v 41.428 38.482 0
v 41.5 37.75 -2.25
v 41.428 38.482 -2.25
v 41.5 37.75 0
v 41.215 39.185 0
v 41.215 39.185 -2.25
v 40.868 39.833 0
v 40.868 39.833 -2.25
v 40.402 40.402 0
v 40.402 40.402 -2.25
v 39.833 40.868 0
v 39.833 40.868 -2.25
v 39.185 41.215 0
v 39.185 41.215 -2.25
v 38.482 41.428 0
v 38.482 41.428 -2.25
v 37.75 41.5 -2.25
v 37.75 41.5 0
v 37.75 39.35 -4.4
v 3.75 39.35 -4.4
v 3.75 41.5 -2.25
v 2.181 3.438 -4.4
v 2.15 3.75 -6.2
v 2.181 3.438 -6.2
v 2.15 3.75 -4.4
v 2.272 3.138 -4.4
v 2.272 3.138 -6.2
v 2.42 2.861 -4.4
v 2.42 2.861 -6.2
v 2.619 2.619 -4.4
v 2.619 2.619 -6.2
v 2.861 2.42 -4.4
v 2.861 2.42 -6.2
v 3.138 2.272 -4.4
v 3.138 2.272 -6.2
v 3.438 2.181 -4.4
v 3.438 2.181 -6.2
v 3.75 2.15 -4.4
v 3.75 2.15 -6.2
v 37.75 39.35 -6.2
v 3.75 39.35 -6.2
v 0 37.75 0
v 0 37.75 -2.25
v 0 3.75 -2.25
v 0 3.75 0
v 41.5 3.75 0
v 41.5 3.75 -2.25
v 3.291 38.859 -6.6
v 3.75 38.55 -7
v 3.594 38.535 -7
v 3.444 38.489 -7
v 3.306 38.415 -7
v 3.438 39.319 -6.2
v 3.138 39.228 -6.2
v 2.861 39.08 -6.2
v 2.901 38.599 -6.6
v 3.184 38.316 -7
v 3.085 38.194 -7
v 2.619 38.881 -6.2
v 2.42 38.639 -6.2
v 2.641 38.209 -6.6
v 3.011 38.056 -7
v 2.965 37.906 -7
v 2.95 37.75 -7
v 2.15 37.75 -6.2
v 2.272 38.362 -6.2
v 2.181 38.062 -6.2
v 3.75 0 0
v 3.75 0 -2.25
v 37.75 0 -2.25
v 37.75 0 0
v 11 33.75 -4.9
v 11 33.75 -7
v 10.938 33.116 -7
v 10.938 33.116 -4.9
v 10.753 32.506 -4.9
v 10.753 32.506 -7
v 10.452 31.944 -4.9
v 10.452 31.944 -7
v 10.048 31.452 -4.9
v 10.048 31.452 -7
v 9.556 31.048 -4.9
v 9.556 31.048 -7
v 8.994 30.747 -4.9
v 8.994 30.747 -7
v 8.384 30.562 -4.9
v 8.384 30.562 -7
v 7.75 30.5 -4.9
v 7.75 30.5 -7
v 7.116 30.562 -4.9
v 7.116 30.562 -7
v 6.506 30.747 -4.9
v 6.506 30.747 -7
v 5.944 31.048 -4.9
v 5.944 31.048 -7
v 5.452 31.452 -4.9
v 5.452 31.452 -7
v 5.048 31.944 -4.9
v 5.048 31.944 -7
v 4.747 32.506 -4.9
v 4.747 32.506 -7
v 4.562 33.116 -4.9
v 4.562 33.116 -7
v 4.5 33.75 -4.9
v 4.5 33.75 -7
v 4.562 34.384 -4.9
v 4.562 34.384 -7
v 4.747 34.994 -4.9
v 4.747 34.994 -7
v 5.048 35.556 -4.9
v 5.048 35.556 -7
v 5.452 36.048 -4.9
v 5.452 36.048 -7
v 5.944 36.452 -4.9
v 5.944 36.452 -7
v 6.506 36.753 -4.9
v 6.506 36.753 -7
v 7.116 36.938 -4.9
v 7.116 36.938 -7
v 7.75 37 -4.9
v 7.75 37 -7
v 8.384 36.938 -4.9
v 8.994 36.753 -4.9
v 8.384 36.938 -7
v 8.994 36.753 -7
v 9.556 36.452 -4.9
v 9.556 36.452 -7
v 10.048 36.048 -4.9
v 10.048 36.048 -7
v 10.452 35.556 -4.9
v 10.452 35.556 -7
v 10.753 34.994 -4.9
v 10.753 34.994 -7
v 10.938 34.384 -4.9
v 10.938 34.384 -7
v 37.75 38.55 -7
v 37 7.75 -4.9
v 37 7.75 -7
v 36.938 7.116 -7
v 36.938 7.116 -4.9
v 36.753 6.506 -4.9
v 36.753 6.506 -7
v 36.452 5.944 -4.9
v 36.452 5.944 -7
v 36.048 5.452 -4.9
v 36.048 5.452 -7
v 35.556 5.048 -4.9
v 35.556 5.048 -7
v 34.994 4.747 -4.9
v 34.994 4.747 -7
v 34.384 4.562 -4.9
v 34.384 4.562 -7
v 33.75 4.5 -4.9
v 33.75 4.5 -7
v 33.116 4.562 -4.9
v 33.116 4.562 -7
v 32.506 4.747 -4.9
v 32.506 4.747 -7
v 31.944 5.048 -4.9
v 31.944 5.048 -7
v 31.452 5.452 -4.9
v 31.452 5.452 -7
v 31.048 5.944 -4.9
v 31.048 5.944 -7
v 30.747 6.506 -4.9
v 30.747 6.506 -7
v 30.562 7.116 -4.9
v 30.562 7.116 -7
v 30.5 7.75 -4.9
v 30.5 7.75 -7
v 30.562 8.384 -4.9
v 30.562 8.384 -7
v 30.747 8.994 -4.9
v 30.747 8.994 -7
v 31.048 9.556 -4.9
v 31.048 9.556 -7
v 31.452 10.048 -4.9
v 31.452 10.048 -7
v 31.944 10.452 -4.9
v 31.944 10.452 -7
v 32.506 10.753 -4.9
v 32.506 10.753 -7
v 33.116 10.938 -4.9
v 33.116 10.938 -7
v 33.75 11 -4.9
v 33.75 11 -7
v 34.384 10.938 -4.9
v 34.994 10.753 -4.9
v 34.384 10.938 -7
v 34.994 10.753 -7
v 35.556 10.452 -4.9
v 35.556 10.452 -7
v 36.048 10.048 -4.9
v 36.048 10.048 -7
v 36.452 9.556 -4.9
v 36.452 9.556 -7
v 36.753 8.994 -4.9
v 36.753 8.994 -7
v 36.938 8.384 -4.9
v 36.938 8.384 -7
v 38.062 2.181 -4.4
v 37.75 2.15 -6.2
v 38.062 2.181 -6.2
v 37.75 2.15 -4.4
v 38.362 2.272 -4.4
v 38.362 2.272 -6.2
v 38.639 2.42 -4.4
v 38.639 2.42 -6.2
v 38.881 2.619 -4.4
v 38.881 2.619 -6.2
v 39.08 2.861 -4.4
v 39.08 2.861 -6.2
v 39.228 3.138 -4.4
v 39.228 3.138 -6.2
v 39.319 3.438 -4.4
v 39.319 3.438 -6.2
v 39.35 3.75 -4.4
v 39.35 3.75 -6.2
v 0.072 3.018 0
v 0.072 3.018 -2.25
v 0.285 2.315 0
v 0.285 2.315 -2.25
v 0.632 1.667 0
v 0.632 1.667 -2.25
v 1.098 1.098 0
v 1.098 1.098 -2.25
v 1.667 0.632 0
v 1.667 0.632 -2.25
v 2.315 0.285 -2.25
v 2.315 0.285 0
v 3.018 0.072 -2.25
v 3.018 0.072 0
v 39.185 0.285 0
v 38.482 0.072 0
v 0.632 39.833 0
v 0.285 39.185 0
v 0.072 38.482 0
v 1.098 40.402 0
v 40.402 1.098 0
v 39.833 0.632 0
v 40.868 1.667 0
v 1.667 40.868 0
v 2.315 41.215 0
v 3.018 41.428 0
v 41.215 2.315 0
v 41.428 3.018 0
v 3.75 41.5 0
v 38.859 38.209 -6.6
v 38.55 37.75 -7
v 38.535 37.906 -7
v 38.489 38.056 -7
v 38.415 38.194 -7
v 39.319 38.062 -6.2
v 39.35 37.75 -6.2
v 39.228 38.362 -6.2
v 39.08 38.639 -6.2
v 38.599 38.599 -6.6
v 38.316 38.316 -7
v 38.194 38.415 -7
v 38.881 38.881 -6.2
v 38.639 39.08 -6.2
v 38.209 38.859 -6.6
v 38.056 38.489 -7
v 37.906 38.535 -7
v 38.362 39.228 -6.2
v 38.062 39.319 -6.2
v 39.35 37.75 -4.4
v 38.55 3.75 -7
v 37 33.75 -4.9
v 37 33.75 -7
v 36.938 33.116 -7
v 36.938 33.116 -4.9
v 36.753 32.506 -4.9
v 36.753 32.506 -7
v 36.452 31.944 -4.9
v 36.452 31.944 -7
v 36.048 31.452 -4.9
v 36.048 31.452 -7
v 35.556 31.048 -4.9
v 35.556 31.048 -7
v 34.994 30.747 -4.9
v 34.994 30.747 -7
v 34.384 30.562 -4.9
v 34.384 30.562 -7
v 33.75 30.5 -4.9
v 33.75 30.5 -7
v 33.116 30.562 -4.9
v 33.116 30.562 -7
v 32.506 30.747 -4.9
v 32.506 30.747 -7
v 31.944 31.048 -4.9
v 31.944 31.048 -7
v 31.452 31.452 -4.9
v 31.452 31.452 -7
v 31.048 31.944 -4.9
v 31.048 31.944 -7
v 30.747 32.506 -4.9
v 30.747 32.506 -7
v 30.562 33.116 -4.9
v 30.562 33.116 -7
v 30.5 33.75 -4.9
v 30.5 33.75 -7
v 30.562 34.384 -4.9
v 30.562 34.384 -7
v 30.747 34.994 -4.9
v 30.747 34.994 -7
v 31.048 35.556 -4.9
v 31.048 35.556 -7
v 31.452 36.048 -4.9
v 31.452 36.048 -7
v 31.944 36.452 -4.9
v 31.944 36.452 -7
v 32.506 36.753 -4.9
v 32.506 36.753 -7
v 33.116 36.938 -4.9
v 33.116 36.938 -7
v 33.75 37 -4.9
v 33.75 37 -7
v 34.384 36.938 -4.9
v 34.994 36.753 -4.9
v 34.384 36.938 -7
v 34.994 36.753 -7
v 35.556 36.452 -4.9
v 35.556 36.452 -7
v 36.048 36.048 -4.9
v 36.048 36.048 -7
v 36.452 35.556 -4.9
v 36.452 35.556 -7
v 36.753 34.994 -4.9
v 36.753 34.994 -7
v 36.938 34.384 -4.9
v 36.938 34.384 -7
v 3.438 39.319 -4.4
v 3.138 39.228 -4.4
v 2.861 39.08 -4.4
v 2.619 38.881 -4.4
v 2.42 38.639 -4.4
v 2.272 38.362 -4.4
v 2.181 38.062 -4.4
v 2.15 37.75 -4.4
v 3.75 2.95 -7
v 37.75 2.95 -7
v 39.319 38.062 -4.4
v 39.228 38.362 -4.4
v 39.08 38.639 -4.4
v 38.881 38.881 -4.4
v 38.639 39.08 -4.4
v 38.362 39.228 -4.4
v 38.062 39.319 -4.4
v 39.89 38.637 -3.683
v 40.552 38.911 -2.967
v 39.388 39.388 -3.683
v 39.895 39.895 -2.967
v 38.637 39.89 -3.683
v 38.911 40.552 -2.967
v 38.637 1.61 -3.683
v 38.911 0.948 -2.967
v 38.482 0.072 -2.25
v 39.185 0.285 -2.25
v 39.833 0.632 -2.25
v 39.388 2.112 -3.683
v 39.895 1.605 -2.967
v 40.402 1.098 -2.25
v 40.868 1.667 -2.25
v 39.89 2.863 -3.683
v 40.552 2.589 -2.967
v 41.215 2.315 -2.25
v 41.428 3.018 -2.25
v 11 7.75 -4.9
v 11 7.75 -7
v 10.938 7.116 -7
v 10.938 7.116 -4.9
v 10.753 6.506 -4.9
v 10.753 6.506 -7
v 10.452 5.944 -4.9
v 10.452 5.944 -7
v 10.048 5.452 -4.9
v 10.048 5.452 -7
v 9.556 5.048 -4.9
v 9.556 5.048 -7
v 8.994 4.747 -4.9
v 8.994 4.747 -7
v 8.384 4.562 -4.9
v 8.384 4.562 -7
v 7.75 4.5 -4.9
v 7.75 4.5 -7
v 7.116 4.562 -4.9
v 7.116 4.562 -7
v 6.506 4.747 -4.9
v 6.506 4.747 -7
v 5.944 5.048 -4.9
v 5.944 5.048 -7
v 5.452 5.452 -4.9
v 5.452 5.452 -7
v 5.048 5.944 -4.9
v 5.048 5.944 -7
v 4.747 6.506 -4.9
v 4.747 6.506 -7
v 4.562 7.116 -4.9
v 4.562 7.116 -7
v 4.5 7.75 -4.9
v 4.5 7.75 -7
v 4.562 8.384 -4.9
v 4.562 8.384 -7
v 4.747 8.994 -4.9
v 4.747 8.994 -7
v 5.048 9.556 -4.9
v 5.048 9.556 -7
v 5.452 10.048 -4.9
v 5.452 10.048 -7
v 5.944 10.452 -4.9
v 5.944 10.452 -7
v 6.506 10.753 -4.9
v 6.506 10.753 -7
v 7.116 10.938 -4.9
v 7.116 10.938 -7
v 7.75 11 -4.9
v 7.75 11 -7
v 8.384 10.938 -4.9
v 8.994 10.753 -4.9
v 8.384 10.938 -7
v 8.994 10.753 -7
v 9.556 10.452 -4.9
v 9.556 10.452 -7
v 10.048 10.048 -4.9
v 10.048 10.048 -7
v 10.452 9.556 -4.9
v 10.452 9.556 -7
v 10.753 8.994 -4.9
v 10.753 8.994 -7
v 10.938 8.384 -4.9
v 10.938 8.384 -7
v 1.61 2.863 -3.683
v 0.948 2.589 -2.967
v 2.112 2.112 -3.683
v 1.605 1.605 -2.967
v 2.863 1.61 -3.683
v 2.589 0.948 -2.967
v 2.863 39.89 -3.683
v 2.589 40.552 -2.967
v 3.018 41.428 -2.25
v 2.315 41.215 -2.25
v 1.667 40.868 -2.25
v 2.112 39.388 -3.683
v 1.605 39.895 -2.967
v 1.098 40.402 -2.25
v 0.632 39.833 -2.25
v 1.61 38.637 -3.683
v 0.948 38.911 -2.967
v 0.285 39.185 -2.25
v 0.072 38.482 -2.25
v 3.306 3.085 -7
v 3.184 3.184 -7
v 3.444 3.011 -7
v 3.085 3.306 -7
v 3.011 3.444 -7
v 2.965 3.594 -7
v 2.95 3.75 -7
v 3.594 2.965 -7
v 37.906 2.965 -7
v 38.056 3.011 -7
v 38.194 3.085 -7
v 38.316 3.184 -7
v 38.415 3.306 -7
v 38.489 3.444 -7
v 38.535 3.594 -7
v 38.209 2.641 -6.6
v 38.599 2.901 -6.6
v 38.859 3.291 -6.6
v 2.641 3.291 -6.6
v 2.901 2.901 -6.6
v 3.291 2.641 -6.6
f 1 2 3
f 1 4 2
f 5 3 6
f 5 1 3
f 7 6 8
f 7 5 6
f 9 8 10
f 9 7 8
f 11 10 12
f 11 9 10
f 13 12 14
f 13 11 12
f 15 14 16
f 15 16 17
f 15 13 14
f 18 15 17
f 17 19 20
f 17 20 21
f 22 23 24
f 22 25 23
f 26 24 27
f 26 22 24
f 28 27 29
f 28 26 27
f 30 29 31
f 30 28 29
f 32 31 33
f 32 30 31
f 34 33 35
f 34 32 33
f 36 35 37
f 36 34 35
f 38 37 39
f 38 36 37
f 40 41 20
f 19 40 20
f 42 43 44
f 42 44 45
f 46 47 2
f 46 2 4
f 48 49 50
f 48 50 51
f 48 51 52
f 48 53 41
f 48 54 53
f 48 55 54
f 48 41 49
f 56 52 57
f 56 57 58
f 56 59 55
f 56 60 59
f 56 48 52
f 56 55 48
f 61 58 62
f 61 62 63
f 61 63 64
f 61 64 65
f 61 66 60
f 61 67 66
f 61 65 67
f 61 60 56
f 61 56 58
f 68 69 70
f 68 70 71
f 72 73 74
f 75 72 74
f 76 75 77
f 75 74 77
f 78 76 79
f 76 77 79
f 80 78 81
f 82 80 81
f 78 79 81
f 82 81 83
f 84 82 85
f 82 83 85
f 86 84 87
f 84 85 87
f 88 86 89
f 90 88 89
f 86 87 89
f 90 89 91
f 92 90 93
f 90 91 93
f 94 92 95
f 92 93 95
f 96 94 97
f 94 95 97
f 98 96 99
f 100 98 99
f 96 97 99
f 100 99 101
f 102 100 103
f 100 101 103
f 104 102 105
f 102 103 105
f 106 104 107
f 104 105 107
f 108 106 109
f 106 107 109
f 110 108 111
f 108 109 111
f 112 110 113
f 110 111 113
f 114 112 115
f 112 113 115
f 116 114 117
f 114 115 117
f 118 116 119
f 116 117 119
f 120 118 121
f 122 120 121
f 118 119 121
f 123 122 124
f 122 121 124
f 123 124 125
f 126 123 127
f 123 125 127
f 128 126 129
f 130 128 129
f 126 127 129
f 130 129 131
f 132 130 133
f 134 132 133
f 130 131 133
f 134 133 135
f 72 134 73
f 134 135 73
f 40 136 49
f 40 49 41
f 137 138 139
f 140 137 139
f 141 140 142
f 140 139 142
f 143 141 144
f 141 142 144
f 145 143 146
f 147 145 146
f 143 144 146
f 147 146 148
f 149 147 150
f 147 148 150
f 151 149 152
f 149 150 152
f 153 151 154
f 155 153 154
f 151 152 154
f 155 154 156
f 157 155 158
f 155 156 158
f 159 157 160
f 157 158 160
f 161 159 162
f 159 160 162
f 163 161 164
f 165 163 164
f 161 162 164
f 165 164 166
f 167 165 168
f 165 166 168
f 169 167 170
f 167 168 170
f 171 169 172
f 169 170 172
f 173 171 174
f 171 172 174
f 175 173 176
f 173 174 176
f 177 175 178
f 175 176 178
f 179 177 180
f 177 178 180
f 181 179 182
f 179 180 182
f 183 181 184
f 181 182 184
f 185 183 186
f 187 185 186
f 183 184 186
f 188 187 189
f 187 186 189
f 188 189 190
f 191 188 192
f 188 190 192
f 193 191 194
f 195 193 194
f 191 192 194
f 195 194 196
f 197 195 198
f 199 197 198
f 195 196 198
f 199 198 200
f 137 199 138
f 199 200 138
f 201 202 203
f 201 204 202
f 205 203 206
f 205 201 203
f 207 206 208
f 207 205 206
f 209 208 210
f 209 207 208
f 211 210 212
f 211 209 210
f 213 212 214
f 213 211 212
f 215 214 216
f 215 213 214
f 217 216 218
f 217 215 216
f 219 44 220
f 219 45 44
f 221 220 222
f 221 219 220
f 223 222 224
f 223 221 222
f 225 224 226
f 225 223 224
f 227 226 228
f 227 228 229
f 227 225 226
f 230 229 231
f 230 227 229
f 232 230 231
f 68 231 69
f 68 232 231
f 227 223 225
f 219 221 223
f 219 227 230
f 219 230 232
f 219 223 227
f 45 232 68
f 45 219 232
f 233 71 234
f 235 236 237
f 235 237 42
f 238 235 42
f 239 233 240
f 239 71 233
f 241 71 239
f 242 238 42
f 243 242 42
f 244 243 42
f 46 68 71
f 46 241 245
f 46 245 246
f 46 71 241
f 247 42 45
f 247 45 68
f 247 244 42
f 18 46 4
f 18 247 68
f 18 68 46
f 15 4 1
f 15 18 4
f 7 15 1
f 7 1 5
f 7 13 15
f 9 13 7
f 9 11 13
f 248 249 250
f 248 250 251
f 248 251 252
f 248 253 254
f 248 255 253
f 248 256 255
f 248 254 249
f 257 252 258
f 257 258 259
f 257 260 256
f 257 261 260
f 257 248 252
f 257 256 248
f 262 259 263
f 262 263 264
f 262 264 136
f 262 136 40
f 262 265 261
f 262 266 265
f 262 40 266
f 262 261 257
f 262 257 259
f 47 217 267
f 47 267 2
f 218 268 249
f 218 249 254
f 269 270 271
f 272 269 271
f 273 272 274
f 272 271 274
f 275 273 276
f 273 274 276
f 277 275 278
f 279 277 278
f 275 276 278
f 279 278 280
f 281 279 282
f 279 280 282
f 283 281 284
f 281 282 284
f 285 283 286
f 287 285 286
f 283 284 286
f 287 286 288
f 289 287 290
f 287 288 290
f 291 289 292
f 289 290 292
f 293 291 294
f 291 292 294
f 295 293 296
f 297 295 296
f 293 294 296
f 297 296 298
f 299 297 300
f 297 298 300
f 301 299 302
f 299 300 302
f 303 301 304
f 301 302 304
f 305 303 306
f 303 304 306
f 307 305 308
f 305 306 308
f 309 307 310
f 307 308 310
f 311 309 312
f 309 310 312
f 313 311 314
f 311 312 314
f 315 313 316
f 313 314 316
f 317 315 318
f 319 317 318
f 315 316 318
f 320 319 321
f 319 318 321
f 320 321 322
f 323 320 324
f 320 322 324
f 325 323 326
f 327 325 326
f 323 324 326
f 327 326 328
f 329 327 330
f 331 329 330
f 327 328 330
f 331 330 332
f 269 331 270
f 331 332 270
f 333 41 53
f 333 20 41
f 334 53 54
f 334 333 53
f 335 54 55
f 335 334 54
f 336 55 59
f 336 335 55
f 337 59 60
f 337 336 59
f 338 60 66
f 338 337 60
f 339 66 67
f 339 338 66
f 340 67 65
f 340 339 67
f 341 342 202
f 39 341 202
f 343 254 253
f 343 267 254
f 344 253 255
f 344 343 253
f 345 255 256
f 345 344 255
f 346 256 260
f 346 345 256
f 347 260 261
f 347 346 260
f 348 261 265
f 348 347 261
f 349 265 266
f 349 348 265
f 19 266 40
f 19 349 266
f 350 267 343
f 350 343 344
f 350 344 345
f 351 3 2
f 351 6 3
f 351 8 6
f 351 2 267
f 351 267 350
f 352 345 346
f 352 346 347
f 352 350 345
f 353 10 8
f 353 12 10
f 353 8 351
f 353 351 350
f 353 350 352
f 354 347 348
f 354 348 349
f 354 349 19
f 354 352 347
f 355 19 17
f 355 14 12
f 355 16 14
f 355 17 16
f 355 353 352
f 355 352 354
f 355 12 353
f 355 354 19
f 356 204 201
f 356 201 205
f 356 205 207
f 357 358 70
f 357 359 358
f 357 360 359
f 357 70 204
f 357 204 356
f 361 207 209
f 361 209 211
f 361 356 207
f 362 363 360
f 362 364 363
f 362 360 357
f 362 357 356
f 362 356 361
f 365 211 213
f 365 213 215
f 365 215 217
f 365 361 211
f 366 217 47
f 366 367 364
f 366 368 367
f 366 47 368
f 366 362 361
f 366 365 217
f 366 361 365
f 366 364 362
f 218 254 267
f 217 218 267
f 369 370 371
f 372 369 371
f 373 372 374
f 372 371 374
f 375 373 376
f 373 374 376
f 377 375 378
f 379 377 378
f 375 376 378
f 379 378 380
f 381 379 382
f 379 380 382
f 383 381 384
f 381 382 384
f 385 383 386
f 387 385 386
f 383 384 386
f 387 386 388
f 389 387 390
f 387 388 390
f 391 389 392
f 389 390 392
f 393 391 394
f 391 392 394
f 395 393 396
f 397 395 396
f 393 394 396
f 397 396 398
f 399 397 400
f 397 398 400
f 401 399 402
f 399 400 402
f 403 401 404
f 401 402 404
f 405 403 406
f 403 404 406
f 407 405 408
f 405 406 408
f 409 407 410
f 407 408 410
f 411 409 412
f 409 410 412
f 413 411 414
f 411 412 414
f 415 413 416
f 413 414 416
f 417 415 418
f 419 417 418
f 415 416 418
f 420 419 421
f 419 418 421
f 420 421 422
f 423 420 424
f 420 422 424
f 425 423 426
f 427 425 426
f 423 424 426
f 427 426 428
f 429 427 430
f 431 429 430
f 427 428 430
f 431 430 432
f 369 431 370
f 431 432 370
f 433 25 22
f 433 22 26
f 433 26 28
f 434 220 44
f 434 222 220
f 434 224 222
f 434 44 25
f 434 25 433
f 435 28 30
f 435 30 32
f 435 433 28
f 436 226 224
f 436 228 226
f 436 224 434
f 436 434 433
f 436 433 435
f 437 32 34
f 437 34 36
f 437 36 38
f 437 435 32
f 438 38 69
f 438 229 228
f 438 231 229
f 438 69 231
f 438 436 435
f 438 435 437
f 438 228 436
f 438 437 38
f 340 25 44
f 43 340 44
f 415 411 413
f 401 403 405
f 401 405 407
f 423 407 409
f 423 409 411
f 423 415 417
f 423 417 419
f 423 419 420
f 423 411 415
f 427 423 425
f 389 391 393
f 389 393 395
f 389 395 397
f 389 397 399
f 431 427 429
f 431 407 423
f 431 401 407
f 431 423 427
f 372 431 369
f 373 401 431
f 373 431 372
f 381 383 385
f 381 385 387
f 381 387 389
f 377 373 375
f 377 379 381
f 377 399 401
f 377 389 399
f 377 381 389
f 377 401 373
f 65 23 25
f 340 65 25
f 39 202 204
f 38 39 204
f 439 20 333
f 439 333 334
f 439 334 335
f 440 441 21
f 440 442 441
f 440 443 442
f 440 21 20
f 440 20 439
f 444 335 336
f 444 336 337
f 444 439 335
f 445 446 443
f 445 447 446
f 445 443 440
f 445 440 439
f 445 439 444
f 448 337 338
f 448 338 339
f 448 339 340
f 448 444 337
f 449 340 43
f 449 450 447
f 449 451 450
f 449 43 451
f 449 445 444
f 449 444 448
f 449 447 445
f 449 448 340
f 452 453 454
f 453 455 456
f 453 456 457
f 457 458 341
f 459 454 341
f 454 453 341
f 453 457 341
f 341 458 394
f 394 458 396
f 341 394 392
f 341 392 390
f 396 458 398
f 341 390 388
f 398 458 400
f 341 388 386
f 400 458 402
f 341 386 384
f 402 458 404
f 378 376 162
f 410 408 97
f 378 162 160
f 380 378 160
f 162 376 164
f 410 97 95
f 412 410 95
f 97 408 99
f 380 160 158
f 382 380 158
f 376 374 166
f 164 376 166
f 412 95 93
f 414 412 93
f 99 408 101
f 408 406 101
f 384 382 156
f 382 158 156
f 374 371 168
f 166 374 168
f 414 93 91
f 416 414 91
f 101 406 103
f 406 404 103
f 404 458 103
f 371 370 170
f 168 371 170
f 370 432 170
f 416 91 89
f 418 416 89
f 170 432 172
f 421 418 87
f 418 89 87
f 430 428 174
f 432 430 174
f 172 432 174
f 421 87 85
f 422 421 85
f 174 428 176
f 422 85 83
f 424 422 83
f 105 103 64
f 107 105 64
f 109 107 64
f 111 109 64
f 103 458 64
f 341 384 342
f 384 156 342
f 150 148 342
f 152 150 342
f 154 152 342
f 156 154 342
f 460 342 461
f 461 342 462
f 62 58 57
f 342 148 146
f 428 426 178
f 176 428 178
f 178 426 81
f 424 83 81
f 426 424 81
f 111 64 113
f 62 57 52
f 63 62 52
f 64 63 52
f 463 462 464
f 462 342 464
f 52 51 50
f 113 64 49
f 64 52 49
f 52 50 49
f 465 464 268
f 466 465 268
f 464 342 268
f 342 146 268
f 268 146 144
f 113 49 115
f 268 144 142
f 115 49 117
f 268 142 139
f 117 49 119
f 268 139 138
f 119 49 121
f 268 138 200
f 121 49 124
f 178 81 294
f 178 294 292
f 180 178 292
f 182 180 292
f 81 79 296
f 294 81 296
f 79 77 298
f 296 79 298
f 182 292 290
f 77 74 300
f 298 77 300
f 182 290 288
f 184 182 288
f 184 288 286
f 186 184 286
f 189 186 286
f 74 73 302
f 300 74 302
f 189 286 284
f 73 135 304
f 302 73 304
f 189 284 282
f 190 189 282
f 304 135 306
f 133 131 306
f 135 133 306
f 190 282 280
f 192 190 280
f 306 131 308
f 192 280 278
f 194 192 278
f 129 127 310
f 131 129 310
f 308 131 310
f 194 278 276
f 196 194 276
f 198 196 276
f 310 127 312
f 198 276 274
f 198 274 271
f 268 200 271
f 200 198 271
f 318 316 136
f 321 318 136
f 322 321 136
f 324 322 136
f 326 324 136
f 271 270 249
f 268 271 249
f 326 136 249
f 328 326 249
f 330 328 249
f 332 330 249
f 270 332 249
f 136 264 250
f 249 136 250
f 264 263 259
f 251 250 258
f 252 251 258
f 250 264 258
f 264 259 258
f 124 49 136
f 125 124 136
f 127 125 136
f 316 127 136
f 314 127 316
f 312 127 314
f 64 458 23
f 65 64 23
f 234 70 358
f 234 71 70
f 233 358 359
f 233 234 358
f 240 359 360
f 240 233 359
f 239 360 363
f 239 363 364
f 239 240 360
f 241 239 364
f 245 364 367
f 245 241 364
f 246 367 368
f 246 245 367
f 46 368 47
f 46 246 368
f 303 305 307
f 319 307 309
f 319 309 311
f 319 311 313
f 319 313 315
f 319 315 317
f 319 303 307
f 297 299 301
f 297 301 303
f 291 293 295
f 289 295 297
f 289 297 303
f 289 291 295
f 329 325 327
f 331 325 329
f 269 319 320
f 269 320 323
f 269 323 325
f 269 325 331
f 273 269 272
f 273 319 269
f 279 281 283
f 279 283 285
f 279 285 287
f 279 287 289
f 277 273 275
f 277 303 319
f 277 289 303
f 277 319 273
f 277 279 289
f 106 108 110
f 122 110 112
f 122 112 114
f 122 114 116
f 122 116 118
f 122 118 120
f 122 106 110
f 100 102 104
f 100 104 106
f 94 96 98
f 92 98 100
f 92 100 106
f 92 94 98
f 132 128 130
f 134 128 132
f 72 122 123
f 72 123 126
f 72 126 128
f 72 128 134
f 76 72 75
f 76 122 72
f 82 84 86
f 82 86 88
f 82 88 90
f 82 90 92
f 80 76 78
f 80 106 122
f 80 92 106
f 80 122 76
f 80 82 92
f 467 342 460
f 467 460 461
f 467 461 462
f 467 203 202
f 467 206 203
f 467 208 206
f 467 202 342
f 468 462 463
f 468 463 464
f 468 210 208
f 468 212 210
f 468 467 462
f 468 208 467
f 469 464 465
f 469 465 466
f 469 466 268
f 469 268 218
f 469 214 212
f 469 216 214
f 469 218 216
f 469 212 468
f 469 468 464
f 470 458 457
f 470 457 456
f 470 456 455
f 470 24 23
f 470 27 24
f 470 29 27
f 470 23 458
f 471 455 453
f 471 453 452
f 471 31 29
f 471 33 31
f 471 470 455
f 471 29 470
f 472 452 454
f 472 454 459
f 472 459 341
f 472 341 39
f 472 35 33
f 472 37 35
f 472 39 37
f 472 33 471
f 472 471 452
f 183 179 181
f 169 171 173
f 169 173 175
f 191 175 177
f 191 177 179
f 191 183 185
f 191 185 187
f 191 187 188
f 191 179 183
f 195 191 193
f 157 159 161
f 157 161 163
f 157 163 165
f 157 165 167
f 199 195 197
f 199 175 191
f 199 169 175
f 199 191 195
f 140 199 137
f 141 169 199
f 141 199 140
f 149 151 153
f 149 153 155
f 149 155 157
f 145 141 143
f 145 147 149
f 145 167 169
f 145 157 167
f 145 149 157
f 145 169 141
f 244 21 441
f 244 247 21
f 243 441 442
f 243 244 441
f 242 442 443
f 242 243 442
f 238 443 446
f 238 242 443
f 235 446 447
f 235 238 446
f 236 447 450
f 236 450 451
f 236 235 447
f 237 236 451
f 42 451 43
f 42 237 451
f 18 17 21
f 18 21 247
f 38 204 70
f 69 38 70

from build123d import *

# Parameters (mm, degrees)
PAD_DEPTH    = 7
SKETCH002_R  = 3.25
POCKET_DEPTH = 2.1


with BuildPart() as part:
    # AdditivePipe: sweep along a path in Sketch001
    with BuildLine(Plane.XY) as additivepipe_path:
        ThreePointArc((0, 3.75), (1.09835, 1.09835), (3.75, 0))
        Line((3.75, 0), (37.75, 0))
        ThreePointArc((37.75, 0), (40.40165, 1.09835), (41.5, 3.75))
        Line((41.5, 3.75), (41.5, 37.75))
        ThreePointArc((41.5, 37.75), (40.40165, 40.40165), (37.75, 41.5))
        Line((37.75, 41.5), (3.75, 41.5))
        ThreePointArc((3.75, 41.5), (1.09835, 40.40165), (0, 37.75))
        Line((0, 37.75), (0, 3.75))
    # Sketch (on Edge2 of Sketch001) → AdditivePipe (sweep)
    with BuildSketch(Plane(origin=(37.75, 0, 0), x_dir=(0, -1, 0), z_dir=(-1, 0, 0))):
        Polygon((-2.95, -7), (-2.15, -6.2), (-2.15, -4.4), (0, -2.25), (0, 0), (-2.95, 0), align=None)
    sweep(path=additivepipe_path.line)

    # Sketch003 (on AdditivePipe) → Pad (new body)
    with BuildSketch(Plane.XY):
        with BuildLine():
            ThreePointArc((3.75, 38.55), (3.184315, 38.315685), (2.95, 37.75))
            Line((2.95, 3.75), (2.95, 37.75))
            ThreePointArc((2.95, 3.75), (3.184315, 3.184315), (3.75, 2.95))
            Line((37.75, 2.95), (3.75, 2.95))
            ThreePointArc((37.75, 2.95), (38.315685, 3.184315), (38.55, 3.75))
            Line((38.55, 37.75), (38.55, 3.75))
            ThreePointArc((38.55, 37.75), (38.315685, 38.315685), (37.75, 38.55))
            Line((3.75, 38.55), (37.75, 38.55))
        make_face()
    extrude(amount=-PAD_DEPTH)

    # Sketch002 (on Face2 of Pad) → Pocket (cut)
    with BuildSketch(Plane(origin=(0, 41.5, -7), x_dir=(1, 0, 0), z_dir=(0, 0, -1))):
        with Locations((7.75, 7.75)):
            Circle(SKETCH002_R)
        with Locations((33.75, 7.75)):
            Circle(SKETCH002_R)
        with Locations((33.75, 33.75)):
            Circle(SKETCH002_R)
        with Locations((7.75, 33.75)):
            Circle(SKETCH002_R)
    extrude(amount=-POCKET_DEPTH, mode=Mode.SUBTRACT)


solid = part.part
